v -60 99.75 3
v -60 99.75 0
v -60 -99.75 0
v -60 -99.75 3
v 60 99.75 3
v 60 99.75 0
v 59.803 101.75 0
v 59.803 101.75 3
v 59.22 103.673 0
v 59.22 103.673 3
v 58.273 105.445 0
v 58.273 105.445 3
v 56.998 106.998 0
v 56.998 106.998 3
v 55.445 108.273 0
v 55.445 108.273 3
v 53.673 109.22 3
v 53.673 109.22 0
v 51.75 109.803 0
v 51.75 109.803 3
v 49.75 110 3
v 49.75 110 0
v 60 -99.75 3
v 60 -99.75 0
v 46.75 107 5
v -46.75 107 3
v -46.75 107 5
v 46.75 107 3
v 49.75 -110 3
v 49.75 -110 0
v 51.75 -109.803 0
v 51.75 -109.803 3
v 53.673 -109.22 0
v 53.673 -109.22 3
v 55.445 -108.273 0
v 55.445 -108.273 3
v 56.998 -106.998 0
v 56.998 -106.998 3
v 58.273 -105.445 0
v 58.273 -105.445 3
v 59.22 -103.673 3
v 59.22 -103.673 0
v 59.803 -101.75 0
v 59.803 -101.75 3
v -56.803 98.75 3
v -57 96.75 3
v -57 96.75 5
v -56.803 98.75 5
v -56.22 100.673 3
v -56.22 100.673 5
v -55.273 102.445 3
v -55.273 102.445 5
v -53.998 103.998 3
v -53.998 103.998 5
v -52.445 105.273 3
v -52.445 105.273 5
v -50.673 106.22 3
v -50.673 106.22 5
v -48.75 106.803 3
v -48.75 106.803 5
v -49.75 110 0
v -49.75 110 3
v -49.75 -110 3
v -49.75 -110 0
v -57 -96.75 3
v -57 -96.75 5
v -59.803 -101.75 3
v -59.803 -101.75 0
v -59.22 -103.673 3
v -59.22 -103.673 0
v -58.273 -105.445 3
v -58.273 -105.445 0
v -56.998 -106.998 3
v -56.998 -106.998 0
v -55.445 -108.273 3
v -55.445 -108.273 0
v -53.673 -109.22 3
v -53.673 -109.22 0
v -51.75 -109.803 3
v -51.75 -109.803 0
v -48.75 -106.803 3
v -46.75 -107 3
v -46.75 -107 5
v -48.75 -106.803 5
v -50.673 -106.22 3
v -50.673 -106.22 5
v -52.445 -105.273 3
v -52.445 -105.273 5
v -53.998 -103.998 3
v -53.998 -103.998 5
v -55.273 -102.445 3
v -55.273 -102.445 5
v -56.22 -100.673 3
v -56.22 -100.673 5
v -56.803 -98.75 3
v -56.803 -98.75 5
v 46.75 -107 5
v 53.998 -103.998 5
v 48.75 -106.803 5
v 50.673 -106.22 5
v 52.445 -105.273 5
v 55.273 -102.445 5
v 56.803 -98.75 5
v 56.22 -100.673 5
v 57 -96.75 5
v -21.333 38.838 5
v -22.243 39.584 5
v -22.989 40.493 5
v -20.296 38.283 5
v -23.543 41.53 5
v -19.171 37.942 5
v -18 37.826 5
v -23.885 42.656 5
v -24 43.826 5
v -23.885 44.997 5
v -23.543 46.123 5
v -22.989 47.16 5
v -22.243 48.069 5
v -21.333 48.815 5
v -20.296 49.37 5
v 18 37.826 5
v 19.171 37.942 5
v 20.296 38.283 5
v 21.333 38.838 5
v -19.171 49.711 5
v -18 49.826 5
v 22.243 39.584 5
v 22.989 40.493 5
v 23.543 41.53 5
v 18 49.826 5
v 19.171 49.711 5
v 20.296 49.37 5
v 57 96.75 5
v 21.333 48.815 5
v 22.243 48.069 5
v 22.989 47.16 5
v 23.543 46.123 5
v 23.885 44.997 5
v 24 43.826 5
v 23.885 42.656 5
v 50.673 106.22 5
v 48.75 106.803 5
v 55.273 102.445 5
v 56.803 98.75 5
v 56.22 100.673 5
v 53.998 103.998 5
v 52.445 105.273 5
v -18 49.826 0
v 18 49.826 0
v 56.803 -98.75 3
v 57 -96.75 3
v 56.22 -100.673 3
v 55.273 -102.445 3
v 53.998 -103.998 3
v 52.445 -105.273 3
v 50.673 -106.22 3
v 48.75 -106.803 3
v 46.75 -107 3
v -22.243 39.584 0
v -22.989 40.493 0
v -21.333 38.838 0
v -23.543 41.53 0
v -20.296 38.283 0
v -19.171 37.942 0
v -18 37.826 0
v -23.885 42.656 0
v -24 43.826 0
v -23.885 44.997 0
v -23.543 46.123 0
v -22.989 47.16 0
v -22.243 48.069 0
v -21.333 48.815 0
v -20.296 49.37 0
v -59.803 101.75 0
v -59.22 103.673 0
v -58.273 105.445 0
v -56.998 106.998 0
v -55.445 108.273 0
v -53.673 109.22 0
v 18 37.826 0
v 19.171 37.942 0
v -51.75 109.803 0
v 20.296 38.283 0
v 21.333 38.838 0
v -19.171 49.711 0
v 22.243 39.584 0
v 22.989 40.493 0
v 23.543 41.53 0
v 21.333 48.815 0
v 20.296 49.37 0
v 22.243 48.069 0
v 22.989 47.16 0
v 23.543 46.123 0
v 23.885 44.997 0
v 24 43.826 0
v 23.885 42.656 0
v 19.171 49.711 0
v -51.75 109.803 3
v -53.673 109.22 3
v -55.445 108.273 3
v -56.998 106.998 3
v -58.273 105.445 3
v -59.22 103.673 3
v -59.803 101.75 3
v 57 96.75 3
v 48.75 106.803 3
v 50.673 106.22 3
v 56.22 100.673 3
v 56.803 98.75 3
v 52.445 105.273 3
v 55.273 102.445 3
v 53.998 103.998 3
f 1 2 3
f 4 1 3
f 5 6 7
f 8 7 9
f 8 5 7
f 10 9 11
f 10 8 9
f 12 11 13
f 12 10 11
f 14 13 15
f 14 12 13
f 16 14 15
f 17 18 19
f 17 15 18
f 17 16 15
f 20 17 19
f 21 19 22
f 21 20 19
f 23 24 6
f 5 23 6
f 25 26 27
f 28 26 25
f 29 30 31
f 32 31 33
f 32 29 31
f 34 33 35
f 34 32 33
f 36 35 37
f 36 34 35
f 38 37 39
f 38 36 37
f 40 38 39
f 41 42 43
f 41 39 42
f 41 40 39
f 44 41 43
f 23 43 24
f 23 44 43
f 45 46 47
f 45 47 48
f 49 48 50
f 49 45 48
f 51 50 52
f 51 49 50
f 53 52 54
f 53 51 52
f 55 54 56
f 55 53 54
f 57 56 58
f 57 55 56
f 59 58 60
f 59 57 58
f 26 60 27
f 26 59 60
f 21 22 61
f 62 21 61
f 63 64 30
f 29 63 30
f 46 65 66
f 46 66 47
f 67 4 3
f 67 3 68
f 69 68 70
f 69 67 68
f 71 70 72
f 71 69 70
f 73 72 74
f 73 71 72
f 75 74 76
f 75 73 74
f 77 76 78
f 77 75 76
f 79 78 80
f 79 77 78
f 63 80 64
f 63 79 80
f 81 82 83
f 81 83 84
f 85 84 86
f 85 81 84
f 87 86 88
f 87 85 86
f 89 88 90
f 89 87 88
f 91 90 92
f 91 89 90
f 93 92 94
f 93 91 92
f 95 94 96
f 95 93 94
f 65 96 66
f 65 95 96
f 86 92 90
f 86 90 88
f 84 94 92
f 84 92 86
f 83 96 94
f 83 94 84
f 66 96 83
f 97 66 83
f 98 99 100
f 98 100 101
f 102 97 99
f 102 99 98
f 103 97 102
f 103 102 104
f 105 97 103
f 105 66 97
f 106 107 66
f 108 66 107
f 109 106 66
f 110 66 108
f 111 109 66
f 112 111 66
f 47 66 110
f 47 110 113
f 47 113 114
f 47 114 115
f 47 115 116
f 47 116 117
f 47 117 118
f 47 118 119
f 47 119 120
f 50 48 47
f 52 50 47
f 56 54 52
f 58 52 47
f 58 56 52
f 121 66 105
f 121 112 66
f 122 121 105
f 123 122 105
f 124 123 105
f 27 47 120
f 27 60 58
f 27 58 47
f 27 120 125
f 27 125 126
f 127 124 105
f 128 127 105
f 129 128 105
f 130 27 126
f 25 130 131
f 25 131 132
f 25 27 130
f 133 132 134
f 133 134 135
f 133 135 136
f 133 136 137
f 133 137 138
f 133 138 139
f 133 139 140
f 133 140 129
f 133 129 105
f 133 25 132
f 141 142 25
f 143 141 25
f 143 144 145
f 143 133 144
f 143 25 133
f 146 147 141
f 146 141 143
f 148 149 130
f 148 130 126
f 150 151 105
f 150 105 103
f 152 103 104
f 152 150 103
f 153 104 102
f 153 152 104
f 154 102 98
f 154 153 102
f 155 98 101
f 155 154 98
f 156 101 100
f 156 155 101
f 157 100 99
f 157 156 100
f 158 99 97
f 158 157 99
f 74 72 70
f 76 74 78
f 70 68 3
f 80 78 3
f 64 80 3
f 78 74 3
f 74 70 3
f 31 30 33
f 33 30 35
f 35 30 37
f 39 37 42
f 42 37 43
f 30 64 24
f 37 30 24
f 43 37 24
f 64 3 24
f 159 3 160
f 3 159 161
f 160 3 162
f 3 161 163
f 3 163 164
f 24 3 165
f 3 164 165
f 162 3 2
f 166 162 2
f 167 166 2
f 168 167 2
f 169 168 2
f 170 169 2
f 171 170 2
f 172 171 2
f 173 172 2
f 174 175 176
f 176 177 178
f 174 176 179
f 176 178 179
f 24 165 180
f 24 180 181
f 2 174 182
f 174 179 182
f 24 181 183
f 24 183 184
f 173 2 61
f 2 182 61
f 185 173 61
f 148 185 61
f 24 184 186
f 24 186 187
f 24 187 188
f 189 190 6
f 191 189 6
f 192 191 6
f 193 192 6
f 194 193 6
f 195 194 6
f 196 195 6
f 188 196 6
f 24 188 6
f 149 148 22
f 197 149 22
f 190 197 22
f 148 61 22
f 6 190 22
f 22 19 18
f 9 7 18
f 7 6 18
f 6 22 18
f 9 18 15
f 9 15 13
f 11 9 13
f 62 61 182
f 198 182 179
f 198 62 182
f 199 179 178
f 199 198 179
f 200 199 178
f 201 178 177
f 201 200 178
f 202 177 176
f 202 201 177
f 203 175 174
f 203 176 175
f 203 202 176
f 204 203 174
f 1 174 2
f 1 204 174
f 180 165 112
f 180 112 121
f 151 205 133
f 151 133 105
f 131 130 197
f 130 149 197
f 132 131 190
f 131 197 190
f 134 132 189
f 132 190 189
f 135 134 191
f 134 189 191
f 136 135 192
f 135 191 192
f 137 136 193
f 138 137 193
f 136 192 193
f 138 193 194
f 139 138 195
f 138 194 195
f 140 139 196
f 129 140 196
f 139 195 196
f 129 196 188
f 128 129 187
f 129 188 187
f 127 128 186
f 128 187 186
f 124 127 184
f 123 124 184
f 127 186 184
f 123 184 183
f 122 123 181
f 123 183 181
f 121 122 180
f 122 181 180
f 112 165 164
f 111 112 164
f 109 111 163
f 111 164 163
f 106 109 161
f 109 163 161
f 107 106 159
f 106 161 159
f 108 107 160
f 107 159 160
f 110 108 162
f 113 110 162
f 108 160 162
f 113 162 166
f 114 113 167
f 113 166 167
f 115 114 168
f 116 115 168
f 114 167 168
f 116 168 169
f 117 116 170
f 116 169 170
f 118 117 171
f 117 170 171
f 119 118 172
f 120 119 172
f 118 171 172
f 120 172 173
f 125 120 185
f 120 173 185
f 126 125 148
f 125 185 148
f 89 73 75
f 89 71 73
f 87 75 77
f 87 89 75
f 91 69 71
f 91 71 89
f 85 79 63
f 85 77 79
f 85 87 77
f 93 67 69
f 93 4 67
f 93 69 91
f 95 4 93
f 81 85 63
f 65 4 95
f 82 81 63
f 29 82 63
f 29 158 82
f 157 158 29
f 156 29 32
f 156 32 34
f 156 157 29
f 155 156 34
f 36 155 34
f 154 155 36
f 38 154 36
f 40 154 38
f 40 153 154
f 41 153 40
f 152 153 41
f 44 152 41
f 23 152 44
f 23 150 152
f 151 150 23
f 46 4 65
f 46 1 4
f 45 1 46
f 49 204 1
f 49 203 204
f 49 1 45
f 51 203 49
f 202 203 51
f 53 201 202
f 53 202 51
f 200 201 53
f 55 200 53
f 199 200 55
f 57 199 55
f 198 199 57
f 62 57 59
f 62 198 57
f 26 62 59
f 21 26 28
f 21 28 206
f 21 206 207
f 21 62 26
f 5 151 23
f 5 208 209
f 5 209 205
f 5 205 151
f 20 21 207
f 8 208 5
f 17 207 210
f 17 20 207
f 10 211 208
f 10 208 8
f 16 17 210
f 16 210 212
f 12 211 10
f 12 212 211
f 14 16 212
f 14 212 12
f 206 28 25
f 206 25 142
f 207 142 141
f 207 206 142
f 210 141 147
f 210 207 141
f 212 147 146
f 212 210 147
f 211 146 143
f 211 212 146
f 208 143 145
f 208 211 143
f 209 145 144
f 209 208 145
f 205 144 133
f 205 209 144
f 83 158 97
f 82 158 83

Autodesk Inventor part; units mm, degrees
ref_plane "YZ Plane" through (0, 0, 0) normal (1, 0, 0) x (0, 1, 0)
ref_plane "XZ Plane" through (0, 0, 0) normal (0, 1, 0) x (-1, 0, 0)
ref_plane "XY Plane" through (0, 0, 0) normal (0, 0, 1) x (1, 0, 0)
sketch "Sketch1" plane through (0, 0, 0) normal (0, 0, 1) x (1, 0, 0)
  line L0 (0, 0) -> (64.8574, 0) construction
  line L1 (-60, -110) -> (60, -110)
  line L2 (60, -110) -> (60, 110)
  line L3 (60, 110) -> (-60, 110)
  line L4 (-60, 110) -> (-60, -110)
  line L5 (-60, -110) -> (60, 110) construction
  line L6 (60, -110) -> (-60, 110) construction
  dimension "d0" = 120
  dimension "d1" = 220
extrude "Extrusion1" add sketch "Sketch1" along normal blind 3
fillet "Fillet1" radius 10.25 4 edges at (60, 110, 1.5) (-60, 110, 1.5) (60, -110, 1.5) (-60, -110, 1.5)
sketch "Sketch2" plane through (0, 0, 3) normal (0, 0, 1) x (1, 0, 0)
  line L0 (0, 0) -> (47.0336, 0) construction
  line L1 (-30, -55) -> (30, -55)
  line L2 (30, -55) -> (30, 55)
  line L3 (30, 55) -> (-30, 55)
  line L4 (-30, 55) -> (-30, -55)
  line L5 (-30, -55) -> (30, 55) construction
  line L6 (30, -55) -> (-30, 55) construction
  line L7 (-57, 107) -> (57, 107)
  line L8 (57, 107) -> (57, -107)
  line L9 (57, -107) -> (-57, -107)
  line L10 (-57, -107) -> (-57, 107)
  dimension "d5" = 60
  dimension "d6" = 110
  dimension "d7" = -52
extrude "Extrusion2" add sketch "Sketch2" along normal blind 2 contours L4 L3 L2 L1 | L7 L8 L9 L10
fillet "Fillet2" radius 10.25 4 edges at (57, 107, 4) (-57, 107, 4) (-57, -107, 4) (57, -107, 4)
sketch "Sketch3" plane through (0, 0, 0) normal (0, 0, -1) x (-1, 0, 0)
  line L0 (18, 43.8265) -> (-18, 43.8265) construction
  line L1 (18, 46.8265) -> (-18, 46.8265)
  line L2 (-18, 40.8265) -> (18, 40.8265)
  arc A0 (18, 40.8265) -> (18, 46.8265) centre (18, 43.8265) ccw
  arc A1 (-18, 46.8265) -> (-18, 40.8265) centre (-18, 43.8265) ccw
  line L3 (-18, 49.8265) -> (18, 49.8265)
  arc A2 (18, 37.8265) -> (18, 49.8265) centre (18, 43.8265) ccw
  line L4 (18, 37.8265) -> (-18, 37.8265)
  arc A3 (-18, 49.8265) -> (-18, 37.8265) centre (-18, 43.8265) ccw
  point P0 (0, 0)
  point P1 (0, 43.8265)
  dimension "d11" = 18
  dimension "d12" = 6
  dimension "d15" = 3
extrude "Extrusion3" cut sketch "Sketch3" against normal through all contours A0 L2 A1 L1 | L3 A2 L4 A3
sketch "Sketch4" plane through (0, 0, 4) normal (0, 0, -1) x (-1, 0, 0)
  point P0 (0, 0)
properties part number "BackPlate"
